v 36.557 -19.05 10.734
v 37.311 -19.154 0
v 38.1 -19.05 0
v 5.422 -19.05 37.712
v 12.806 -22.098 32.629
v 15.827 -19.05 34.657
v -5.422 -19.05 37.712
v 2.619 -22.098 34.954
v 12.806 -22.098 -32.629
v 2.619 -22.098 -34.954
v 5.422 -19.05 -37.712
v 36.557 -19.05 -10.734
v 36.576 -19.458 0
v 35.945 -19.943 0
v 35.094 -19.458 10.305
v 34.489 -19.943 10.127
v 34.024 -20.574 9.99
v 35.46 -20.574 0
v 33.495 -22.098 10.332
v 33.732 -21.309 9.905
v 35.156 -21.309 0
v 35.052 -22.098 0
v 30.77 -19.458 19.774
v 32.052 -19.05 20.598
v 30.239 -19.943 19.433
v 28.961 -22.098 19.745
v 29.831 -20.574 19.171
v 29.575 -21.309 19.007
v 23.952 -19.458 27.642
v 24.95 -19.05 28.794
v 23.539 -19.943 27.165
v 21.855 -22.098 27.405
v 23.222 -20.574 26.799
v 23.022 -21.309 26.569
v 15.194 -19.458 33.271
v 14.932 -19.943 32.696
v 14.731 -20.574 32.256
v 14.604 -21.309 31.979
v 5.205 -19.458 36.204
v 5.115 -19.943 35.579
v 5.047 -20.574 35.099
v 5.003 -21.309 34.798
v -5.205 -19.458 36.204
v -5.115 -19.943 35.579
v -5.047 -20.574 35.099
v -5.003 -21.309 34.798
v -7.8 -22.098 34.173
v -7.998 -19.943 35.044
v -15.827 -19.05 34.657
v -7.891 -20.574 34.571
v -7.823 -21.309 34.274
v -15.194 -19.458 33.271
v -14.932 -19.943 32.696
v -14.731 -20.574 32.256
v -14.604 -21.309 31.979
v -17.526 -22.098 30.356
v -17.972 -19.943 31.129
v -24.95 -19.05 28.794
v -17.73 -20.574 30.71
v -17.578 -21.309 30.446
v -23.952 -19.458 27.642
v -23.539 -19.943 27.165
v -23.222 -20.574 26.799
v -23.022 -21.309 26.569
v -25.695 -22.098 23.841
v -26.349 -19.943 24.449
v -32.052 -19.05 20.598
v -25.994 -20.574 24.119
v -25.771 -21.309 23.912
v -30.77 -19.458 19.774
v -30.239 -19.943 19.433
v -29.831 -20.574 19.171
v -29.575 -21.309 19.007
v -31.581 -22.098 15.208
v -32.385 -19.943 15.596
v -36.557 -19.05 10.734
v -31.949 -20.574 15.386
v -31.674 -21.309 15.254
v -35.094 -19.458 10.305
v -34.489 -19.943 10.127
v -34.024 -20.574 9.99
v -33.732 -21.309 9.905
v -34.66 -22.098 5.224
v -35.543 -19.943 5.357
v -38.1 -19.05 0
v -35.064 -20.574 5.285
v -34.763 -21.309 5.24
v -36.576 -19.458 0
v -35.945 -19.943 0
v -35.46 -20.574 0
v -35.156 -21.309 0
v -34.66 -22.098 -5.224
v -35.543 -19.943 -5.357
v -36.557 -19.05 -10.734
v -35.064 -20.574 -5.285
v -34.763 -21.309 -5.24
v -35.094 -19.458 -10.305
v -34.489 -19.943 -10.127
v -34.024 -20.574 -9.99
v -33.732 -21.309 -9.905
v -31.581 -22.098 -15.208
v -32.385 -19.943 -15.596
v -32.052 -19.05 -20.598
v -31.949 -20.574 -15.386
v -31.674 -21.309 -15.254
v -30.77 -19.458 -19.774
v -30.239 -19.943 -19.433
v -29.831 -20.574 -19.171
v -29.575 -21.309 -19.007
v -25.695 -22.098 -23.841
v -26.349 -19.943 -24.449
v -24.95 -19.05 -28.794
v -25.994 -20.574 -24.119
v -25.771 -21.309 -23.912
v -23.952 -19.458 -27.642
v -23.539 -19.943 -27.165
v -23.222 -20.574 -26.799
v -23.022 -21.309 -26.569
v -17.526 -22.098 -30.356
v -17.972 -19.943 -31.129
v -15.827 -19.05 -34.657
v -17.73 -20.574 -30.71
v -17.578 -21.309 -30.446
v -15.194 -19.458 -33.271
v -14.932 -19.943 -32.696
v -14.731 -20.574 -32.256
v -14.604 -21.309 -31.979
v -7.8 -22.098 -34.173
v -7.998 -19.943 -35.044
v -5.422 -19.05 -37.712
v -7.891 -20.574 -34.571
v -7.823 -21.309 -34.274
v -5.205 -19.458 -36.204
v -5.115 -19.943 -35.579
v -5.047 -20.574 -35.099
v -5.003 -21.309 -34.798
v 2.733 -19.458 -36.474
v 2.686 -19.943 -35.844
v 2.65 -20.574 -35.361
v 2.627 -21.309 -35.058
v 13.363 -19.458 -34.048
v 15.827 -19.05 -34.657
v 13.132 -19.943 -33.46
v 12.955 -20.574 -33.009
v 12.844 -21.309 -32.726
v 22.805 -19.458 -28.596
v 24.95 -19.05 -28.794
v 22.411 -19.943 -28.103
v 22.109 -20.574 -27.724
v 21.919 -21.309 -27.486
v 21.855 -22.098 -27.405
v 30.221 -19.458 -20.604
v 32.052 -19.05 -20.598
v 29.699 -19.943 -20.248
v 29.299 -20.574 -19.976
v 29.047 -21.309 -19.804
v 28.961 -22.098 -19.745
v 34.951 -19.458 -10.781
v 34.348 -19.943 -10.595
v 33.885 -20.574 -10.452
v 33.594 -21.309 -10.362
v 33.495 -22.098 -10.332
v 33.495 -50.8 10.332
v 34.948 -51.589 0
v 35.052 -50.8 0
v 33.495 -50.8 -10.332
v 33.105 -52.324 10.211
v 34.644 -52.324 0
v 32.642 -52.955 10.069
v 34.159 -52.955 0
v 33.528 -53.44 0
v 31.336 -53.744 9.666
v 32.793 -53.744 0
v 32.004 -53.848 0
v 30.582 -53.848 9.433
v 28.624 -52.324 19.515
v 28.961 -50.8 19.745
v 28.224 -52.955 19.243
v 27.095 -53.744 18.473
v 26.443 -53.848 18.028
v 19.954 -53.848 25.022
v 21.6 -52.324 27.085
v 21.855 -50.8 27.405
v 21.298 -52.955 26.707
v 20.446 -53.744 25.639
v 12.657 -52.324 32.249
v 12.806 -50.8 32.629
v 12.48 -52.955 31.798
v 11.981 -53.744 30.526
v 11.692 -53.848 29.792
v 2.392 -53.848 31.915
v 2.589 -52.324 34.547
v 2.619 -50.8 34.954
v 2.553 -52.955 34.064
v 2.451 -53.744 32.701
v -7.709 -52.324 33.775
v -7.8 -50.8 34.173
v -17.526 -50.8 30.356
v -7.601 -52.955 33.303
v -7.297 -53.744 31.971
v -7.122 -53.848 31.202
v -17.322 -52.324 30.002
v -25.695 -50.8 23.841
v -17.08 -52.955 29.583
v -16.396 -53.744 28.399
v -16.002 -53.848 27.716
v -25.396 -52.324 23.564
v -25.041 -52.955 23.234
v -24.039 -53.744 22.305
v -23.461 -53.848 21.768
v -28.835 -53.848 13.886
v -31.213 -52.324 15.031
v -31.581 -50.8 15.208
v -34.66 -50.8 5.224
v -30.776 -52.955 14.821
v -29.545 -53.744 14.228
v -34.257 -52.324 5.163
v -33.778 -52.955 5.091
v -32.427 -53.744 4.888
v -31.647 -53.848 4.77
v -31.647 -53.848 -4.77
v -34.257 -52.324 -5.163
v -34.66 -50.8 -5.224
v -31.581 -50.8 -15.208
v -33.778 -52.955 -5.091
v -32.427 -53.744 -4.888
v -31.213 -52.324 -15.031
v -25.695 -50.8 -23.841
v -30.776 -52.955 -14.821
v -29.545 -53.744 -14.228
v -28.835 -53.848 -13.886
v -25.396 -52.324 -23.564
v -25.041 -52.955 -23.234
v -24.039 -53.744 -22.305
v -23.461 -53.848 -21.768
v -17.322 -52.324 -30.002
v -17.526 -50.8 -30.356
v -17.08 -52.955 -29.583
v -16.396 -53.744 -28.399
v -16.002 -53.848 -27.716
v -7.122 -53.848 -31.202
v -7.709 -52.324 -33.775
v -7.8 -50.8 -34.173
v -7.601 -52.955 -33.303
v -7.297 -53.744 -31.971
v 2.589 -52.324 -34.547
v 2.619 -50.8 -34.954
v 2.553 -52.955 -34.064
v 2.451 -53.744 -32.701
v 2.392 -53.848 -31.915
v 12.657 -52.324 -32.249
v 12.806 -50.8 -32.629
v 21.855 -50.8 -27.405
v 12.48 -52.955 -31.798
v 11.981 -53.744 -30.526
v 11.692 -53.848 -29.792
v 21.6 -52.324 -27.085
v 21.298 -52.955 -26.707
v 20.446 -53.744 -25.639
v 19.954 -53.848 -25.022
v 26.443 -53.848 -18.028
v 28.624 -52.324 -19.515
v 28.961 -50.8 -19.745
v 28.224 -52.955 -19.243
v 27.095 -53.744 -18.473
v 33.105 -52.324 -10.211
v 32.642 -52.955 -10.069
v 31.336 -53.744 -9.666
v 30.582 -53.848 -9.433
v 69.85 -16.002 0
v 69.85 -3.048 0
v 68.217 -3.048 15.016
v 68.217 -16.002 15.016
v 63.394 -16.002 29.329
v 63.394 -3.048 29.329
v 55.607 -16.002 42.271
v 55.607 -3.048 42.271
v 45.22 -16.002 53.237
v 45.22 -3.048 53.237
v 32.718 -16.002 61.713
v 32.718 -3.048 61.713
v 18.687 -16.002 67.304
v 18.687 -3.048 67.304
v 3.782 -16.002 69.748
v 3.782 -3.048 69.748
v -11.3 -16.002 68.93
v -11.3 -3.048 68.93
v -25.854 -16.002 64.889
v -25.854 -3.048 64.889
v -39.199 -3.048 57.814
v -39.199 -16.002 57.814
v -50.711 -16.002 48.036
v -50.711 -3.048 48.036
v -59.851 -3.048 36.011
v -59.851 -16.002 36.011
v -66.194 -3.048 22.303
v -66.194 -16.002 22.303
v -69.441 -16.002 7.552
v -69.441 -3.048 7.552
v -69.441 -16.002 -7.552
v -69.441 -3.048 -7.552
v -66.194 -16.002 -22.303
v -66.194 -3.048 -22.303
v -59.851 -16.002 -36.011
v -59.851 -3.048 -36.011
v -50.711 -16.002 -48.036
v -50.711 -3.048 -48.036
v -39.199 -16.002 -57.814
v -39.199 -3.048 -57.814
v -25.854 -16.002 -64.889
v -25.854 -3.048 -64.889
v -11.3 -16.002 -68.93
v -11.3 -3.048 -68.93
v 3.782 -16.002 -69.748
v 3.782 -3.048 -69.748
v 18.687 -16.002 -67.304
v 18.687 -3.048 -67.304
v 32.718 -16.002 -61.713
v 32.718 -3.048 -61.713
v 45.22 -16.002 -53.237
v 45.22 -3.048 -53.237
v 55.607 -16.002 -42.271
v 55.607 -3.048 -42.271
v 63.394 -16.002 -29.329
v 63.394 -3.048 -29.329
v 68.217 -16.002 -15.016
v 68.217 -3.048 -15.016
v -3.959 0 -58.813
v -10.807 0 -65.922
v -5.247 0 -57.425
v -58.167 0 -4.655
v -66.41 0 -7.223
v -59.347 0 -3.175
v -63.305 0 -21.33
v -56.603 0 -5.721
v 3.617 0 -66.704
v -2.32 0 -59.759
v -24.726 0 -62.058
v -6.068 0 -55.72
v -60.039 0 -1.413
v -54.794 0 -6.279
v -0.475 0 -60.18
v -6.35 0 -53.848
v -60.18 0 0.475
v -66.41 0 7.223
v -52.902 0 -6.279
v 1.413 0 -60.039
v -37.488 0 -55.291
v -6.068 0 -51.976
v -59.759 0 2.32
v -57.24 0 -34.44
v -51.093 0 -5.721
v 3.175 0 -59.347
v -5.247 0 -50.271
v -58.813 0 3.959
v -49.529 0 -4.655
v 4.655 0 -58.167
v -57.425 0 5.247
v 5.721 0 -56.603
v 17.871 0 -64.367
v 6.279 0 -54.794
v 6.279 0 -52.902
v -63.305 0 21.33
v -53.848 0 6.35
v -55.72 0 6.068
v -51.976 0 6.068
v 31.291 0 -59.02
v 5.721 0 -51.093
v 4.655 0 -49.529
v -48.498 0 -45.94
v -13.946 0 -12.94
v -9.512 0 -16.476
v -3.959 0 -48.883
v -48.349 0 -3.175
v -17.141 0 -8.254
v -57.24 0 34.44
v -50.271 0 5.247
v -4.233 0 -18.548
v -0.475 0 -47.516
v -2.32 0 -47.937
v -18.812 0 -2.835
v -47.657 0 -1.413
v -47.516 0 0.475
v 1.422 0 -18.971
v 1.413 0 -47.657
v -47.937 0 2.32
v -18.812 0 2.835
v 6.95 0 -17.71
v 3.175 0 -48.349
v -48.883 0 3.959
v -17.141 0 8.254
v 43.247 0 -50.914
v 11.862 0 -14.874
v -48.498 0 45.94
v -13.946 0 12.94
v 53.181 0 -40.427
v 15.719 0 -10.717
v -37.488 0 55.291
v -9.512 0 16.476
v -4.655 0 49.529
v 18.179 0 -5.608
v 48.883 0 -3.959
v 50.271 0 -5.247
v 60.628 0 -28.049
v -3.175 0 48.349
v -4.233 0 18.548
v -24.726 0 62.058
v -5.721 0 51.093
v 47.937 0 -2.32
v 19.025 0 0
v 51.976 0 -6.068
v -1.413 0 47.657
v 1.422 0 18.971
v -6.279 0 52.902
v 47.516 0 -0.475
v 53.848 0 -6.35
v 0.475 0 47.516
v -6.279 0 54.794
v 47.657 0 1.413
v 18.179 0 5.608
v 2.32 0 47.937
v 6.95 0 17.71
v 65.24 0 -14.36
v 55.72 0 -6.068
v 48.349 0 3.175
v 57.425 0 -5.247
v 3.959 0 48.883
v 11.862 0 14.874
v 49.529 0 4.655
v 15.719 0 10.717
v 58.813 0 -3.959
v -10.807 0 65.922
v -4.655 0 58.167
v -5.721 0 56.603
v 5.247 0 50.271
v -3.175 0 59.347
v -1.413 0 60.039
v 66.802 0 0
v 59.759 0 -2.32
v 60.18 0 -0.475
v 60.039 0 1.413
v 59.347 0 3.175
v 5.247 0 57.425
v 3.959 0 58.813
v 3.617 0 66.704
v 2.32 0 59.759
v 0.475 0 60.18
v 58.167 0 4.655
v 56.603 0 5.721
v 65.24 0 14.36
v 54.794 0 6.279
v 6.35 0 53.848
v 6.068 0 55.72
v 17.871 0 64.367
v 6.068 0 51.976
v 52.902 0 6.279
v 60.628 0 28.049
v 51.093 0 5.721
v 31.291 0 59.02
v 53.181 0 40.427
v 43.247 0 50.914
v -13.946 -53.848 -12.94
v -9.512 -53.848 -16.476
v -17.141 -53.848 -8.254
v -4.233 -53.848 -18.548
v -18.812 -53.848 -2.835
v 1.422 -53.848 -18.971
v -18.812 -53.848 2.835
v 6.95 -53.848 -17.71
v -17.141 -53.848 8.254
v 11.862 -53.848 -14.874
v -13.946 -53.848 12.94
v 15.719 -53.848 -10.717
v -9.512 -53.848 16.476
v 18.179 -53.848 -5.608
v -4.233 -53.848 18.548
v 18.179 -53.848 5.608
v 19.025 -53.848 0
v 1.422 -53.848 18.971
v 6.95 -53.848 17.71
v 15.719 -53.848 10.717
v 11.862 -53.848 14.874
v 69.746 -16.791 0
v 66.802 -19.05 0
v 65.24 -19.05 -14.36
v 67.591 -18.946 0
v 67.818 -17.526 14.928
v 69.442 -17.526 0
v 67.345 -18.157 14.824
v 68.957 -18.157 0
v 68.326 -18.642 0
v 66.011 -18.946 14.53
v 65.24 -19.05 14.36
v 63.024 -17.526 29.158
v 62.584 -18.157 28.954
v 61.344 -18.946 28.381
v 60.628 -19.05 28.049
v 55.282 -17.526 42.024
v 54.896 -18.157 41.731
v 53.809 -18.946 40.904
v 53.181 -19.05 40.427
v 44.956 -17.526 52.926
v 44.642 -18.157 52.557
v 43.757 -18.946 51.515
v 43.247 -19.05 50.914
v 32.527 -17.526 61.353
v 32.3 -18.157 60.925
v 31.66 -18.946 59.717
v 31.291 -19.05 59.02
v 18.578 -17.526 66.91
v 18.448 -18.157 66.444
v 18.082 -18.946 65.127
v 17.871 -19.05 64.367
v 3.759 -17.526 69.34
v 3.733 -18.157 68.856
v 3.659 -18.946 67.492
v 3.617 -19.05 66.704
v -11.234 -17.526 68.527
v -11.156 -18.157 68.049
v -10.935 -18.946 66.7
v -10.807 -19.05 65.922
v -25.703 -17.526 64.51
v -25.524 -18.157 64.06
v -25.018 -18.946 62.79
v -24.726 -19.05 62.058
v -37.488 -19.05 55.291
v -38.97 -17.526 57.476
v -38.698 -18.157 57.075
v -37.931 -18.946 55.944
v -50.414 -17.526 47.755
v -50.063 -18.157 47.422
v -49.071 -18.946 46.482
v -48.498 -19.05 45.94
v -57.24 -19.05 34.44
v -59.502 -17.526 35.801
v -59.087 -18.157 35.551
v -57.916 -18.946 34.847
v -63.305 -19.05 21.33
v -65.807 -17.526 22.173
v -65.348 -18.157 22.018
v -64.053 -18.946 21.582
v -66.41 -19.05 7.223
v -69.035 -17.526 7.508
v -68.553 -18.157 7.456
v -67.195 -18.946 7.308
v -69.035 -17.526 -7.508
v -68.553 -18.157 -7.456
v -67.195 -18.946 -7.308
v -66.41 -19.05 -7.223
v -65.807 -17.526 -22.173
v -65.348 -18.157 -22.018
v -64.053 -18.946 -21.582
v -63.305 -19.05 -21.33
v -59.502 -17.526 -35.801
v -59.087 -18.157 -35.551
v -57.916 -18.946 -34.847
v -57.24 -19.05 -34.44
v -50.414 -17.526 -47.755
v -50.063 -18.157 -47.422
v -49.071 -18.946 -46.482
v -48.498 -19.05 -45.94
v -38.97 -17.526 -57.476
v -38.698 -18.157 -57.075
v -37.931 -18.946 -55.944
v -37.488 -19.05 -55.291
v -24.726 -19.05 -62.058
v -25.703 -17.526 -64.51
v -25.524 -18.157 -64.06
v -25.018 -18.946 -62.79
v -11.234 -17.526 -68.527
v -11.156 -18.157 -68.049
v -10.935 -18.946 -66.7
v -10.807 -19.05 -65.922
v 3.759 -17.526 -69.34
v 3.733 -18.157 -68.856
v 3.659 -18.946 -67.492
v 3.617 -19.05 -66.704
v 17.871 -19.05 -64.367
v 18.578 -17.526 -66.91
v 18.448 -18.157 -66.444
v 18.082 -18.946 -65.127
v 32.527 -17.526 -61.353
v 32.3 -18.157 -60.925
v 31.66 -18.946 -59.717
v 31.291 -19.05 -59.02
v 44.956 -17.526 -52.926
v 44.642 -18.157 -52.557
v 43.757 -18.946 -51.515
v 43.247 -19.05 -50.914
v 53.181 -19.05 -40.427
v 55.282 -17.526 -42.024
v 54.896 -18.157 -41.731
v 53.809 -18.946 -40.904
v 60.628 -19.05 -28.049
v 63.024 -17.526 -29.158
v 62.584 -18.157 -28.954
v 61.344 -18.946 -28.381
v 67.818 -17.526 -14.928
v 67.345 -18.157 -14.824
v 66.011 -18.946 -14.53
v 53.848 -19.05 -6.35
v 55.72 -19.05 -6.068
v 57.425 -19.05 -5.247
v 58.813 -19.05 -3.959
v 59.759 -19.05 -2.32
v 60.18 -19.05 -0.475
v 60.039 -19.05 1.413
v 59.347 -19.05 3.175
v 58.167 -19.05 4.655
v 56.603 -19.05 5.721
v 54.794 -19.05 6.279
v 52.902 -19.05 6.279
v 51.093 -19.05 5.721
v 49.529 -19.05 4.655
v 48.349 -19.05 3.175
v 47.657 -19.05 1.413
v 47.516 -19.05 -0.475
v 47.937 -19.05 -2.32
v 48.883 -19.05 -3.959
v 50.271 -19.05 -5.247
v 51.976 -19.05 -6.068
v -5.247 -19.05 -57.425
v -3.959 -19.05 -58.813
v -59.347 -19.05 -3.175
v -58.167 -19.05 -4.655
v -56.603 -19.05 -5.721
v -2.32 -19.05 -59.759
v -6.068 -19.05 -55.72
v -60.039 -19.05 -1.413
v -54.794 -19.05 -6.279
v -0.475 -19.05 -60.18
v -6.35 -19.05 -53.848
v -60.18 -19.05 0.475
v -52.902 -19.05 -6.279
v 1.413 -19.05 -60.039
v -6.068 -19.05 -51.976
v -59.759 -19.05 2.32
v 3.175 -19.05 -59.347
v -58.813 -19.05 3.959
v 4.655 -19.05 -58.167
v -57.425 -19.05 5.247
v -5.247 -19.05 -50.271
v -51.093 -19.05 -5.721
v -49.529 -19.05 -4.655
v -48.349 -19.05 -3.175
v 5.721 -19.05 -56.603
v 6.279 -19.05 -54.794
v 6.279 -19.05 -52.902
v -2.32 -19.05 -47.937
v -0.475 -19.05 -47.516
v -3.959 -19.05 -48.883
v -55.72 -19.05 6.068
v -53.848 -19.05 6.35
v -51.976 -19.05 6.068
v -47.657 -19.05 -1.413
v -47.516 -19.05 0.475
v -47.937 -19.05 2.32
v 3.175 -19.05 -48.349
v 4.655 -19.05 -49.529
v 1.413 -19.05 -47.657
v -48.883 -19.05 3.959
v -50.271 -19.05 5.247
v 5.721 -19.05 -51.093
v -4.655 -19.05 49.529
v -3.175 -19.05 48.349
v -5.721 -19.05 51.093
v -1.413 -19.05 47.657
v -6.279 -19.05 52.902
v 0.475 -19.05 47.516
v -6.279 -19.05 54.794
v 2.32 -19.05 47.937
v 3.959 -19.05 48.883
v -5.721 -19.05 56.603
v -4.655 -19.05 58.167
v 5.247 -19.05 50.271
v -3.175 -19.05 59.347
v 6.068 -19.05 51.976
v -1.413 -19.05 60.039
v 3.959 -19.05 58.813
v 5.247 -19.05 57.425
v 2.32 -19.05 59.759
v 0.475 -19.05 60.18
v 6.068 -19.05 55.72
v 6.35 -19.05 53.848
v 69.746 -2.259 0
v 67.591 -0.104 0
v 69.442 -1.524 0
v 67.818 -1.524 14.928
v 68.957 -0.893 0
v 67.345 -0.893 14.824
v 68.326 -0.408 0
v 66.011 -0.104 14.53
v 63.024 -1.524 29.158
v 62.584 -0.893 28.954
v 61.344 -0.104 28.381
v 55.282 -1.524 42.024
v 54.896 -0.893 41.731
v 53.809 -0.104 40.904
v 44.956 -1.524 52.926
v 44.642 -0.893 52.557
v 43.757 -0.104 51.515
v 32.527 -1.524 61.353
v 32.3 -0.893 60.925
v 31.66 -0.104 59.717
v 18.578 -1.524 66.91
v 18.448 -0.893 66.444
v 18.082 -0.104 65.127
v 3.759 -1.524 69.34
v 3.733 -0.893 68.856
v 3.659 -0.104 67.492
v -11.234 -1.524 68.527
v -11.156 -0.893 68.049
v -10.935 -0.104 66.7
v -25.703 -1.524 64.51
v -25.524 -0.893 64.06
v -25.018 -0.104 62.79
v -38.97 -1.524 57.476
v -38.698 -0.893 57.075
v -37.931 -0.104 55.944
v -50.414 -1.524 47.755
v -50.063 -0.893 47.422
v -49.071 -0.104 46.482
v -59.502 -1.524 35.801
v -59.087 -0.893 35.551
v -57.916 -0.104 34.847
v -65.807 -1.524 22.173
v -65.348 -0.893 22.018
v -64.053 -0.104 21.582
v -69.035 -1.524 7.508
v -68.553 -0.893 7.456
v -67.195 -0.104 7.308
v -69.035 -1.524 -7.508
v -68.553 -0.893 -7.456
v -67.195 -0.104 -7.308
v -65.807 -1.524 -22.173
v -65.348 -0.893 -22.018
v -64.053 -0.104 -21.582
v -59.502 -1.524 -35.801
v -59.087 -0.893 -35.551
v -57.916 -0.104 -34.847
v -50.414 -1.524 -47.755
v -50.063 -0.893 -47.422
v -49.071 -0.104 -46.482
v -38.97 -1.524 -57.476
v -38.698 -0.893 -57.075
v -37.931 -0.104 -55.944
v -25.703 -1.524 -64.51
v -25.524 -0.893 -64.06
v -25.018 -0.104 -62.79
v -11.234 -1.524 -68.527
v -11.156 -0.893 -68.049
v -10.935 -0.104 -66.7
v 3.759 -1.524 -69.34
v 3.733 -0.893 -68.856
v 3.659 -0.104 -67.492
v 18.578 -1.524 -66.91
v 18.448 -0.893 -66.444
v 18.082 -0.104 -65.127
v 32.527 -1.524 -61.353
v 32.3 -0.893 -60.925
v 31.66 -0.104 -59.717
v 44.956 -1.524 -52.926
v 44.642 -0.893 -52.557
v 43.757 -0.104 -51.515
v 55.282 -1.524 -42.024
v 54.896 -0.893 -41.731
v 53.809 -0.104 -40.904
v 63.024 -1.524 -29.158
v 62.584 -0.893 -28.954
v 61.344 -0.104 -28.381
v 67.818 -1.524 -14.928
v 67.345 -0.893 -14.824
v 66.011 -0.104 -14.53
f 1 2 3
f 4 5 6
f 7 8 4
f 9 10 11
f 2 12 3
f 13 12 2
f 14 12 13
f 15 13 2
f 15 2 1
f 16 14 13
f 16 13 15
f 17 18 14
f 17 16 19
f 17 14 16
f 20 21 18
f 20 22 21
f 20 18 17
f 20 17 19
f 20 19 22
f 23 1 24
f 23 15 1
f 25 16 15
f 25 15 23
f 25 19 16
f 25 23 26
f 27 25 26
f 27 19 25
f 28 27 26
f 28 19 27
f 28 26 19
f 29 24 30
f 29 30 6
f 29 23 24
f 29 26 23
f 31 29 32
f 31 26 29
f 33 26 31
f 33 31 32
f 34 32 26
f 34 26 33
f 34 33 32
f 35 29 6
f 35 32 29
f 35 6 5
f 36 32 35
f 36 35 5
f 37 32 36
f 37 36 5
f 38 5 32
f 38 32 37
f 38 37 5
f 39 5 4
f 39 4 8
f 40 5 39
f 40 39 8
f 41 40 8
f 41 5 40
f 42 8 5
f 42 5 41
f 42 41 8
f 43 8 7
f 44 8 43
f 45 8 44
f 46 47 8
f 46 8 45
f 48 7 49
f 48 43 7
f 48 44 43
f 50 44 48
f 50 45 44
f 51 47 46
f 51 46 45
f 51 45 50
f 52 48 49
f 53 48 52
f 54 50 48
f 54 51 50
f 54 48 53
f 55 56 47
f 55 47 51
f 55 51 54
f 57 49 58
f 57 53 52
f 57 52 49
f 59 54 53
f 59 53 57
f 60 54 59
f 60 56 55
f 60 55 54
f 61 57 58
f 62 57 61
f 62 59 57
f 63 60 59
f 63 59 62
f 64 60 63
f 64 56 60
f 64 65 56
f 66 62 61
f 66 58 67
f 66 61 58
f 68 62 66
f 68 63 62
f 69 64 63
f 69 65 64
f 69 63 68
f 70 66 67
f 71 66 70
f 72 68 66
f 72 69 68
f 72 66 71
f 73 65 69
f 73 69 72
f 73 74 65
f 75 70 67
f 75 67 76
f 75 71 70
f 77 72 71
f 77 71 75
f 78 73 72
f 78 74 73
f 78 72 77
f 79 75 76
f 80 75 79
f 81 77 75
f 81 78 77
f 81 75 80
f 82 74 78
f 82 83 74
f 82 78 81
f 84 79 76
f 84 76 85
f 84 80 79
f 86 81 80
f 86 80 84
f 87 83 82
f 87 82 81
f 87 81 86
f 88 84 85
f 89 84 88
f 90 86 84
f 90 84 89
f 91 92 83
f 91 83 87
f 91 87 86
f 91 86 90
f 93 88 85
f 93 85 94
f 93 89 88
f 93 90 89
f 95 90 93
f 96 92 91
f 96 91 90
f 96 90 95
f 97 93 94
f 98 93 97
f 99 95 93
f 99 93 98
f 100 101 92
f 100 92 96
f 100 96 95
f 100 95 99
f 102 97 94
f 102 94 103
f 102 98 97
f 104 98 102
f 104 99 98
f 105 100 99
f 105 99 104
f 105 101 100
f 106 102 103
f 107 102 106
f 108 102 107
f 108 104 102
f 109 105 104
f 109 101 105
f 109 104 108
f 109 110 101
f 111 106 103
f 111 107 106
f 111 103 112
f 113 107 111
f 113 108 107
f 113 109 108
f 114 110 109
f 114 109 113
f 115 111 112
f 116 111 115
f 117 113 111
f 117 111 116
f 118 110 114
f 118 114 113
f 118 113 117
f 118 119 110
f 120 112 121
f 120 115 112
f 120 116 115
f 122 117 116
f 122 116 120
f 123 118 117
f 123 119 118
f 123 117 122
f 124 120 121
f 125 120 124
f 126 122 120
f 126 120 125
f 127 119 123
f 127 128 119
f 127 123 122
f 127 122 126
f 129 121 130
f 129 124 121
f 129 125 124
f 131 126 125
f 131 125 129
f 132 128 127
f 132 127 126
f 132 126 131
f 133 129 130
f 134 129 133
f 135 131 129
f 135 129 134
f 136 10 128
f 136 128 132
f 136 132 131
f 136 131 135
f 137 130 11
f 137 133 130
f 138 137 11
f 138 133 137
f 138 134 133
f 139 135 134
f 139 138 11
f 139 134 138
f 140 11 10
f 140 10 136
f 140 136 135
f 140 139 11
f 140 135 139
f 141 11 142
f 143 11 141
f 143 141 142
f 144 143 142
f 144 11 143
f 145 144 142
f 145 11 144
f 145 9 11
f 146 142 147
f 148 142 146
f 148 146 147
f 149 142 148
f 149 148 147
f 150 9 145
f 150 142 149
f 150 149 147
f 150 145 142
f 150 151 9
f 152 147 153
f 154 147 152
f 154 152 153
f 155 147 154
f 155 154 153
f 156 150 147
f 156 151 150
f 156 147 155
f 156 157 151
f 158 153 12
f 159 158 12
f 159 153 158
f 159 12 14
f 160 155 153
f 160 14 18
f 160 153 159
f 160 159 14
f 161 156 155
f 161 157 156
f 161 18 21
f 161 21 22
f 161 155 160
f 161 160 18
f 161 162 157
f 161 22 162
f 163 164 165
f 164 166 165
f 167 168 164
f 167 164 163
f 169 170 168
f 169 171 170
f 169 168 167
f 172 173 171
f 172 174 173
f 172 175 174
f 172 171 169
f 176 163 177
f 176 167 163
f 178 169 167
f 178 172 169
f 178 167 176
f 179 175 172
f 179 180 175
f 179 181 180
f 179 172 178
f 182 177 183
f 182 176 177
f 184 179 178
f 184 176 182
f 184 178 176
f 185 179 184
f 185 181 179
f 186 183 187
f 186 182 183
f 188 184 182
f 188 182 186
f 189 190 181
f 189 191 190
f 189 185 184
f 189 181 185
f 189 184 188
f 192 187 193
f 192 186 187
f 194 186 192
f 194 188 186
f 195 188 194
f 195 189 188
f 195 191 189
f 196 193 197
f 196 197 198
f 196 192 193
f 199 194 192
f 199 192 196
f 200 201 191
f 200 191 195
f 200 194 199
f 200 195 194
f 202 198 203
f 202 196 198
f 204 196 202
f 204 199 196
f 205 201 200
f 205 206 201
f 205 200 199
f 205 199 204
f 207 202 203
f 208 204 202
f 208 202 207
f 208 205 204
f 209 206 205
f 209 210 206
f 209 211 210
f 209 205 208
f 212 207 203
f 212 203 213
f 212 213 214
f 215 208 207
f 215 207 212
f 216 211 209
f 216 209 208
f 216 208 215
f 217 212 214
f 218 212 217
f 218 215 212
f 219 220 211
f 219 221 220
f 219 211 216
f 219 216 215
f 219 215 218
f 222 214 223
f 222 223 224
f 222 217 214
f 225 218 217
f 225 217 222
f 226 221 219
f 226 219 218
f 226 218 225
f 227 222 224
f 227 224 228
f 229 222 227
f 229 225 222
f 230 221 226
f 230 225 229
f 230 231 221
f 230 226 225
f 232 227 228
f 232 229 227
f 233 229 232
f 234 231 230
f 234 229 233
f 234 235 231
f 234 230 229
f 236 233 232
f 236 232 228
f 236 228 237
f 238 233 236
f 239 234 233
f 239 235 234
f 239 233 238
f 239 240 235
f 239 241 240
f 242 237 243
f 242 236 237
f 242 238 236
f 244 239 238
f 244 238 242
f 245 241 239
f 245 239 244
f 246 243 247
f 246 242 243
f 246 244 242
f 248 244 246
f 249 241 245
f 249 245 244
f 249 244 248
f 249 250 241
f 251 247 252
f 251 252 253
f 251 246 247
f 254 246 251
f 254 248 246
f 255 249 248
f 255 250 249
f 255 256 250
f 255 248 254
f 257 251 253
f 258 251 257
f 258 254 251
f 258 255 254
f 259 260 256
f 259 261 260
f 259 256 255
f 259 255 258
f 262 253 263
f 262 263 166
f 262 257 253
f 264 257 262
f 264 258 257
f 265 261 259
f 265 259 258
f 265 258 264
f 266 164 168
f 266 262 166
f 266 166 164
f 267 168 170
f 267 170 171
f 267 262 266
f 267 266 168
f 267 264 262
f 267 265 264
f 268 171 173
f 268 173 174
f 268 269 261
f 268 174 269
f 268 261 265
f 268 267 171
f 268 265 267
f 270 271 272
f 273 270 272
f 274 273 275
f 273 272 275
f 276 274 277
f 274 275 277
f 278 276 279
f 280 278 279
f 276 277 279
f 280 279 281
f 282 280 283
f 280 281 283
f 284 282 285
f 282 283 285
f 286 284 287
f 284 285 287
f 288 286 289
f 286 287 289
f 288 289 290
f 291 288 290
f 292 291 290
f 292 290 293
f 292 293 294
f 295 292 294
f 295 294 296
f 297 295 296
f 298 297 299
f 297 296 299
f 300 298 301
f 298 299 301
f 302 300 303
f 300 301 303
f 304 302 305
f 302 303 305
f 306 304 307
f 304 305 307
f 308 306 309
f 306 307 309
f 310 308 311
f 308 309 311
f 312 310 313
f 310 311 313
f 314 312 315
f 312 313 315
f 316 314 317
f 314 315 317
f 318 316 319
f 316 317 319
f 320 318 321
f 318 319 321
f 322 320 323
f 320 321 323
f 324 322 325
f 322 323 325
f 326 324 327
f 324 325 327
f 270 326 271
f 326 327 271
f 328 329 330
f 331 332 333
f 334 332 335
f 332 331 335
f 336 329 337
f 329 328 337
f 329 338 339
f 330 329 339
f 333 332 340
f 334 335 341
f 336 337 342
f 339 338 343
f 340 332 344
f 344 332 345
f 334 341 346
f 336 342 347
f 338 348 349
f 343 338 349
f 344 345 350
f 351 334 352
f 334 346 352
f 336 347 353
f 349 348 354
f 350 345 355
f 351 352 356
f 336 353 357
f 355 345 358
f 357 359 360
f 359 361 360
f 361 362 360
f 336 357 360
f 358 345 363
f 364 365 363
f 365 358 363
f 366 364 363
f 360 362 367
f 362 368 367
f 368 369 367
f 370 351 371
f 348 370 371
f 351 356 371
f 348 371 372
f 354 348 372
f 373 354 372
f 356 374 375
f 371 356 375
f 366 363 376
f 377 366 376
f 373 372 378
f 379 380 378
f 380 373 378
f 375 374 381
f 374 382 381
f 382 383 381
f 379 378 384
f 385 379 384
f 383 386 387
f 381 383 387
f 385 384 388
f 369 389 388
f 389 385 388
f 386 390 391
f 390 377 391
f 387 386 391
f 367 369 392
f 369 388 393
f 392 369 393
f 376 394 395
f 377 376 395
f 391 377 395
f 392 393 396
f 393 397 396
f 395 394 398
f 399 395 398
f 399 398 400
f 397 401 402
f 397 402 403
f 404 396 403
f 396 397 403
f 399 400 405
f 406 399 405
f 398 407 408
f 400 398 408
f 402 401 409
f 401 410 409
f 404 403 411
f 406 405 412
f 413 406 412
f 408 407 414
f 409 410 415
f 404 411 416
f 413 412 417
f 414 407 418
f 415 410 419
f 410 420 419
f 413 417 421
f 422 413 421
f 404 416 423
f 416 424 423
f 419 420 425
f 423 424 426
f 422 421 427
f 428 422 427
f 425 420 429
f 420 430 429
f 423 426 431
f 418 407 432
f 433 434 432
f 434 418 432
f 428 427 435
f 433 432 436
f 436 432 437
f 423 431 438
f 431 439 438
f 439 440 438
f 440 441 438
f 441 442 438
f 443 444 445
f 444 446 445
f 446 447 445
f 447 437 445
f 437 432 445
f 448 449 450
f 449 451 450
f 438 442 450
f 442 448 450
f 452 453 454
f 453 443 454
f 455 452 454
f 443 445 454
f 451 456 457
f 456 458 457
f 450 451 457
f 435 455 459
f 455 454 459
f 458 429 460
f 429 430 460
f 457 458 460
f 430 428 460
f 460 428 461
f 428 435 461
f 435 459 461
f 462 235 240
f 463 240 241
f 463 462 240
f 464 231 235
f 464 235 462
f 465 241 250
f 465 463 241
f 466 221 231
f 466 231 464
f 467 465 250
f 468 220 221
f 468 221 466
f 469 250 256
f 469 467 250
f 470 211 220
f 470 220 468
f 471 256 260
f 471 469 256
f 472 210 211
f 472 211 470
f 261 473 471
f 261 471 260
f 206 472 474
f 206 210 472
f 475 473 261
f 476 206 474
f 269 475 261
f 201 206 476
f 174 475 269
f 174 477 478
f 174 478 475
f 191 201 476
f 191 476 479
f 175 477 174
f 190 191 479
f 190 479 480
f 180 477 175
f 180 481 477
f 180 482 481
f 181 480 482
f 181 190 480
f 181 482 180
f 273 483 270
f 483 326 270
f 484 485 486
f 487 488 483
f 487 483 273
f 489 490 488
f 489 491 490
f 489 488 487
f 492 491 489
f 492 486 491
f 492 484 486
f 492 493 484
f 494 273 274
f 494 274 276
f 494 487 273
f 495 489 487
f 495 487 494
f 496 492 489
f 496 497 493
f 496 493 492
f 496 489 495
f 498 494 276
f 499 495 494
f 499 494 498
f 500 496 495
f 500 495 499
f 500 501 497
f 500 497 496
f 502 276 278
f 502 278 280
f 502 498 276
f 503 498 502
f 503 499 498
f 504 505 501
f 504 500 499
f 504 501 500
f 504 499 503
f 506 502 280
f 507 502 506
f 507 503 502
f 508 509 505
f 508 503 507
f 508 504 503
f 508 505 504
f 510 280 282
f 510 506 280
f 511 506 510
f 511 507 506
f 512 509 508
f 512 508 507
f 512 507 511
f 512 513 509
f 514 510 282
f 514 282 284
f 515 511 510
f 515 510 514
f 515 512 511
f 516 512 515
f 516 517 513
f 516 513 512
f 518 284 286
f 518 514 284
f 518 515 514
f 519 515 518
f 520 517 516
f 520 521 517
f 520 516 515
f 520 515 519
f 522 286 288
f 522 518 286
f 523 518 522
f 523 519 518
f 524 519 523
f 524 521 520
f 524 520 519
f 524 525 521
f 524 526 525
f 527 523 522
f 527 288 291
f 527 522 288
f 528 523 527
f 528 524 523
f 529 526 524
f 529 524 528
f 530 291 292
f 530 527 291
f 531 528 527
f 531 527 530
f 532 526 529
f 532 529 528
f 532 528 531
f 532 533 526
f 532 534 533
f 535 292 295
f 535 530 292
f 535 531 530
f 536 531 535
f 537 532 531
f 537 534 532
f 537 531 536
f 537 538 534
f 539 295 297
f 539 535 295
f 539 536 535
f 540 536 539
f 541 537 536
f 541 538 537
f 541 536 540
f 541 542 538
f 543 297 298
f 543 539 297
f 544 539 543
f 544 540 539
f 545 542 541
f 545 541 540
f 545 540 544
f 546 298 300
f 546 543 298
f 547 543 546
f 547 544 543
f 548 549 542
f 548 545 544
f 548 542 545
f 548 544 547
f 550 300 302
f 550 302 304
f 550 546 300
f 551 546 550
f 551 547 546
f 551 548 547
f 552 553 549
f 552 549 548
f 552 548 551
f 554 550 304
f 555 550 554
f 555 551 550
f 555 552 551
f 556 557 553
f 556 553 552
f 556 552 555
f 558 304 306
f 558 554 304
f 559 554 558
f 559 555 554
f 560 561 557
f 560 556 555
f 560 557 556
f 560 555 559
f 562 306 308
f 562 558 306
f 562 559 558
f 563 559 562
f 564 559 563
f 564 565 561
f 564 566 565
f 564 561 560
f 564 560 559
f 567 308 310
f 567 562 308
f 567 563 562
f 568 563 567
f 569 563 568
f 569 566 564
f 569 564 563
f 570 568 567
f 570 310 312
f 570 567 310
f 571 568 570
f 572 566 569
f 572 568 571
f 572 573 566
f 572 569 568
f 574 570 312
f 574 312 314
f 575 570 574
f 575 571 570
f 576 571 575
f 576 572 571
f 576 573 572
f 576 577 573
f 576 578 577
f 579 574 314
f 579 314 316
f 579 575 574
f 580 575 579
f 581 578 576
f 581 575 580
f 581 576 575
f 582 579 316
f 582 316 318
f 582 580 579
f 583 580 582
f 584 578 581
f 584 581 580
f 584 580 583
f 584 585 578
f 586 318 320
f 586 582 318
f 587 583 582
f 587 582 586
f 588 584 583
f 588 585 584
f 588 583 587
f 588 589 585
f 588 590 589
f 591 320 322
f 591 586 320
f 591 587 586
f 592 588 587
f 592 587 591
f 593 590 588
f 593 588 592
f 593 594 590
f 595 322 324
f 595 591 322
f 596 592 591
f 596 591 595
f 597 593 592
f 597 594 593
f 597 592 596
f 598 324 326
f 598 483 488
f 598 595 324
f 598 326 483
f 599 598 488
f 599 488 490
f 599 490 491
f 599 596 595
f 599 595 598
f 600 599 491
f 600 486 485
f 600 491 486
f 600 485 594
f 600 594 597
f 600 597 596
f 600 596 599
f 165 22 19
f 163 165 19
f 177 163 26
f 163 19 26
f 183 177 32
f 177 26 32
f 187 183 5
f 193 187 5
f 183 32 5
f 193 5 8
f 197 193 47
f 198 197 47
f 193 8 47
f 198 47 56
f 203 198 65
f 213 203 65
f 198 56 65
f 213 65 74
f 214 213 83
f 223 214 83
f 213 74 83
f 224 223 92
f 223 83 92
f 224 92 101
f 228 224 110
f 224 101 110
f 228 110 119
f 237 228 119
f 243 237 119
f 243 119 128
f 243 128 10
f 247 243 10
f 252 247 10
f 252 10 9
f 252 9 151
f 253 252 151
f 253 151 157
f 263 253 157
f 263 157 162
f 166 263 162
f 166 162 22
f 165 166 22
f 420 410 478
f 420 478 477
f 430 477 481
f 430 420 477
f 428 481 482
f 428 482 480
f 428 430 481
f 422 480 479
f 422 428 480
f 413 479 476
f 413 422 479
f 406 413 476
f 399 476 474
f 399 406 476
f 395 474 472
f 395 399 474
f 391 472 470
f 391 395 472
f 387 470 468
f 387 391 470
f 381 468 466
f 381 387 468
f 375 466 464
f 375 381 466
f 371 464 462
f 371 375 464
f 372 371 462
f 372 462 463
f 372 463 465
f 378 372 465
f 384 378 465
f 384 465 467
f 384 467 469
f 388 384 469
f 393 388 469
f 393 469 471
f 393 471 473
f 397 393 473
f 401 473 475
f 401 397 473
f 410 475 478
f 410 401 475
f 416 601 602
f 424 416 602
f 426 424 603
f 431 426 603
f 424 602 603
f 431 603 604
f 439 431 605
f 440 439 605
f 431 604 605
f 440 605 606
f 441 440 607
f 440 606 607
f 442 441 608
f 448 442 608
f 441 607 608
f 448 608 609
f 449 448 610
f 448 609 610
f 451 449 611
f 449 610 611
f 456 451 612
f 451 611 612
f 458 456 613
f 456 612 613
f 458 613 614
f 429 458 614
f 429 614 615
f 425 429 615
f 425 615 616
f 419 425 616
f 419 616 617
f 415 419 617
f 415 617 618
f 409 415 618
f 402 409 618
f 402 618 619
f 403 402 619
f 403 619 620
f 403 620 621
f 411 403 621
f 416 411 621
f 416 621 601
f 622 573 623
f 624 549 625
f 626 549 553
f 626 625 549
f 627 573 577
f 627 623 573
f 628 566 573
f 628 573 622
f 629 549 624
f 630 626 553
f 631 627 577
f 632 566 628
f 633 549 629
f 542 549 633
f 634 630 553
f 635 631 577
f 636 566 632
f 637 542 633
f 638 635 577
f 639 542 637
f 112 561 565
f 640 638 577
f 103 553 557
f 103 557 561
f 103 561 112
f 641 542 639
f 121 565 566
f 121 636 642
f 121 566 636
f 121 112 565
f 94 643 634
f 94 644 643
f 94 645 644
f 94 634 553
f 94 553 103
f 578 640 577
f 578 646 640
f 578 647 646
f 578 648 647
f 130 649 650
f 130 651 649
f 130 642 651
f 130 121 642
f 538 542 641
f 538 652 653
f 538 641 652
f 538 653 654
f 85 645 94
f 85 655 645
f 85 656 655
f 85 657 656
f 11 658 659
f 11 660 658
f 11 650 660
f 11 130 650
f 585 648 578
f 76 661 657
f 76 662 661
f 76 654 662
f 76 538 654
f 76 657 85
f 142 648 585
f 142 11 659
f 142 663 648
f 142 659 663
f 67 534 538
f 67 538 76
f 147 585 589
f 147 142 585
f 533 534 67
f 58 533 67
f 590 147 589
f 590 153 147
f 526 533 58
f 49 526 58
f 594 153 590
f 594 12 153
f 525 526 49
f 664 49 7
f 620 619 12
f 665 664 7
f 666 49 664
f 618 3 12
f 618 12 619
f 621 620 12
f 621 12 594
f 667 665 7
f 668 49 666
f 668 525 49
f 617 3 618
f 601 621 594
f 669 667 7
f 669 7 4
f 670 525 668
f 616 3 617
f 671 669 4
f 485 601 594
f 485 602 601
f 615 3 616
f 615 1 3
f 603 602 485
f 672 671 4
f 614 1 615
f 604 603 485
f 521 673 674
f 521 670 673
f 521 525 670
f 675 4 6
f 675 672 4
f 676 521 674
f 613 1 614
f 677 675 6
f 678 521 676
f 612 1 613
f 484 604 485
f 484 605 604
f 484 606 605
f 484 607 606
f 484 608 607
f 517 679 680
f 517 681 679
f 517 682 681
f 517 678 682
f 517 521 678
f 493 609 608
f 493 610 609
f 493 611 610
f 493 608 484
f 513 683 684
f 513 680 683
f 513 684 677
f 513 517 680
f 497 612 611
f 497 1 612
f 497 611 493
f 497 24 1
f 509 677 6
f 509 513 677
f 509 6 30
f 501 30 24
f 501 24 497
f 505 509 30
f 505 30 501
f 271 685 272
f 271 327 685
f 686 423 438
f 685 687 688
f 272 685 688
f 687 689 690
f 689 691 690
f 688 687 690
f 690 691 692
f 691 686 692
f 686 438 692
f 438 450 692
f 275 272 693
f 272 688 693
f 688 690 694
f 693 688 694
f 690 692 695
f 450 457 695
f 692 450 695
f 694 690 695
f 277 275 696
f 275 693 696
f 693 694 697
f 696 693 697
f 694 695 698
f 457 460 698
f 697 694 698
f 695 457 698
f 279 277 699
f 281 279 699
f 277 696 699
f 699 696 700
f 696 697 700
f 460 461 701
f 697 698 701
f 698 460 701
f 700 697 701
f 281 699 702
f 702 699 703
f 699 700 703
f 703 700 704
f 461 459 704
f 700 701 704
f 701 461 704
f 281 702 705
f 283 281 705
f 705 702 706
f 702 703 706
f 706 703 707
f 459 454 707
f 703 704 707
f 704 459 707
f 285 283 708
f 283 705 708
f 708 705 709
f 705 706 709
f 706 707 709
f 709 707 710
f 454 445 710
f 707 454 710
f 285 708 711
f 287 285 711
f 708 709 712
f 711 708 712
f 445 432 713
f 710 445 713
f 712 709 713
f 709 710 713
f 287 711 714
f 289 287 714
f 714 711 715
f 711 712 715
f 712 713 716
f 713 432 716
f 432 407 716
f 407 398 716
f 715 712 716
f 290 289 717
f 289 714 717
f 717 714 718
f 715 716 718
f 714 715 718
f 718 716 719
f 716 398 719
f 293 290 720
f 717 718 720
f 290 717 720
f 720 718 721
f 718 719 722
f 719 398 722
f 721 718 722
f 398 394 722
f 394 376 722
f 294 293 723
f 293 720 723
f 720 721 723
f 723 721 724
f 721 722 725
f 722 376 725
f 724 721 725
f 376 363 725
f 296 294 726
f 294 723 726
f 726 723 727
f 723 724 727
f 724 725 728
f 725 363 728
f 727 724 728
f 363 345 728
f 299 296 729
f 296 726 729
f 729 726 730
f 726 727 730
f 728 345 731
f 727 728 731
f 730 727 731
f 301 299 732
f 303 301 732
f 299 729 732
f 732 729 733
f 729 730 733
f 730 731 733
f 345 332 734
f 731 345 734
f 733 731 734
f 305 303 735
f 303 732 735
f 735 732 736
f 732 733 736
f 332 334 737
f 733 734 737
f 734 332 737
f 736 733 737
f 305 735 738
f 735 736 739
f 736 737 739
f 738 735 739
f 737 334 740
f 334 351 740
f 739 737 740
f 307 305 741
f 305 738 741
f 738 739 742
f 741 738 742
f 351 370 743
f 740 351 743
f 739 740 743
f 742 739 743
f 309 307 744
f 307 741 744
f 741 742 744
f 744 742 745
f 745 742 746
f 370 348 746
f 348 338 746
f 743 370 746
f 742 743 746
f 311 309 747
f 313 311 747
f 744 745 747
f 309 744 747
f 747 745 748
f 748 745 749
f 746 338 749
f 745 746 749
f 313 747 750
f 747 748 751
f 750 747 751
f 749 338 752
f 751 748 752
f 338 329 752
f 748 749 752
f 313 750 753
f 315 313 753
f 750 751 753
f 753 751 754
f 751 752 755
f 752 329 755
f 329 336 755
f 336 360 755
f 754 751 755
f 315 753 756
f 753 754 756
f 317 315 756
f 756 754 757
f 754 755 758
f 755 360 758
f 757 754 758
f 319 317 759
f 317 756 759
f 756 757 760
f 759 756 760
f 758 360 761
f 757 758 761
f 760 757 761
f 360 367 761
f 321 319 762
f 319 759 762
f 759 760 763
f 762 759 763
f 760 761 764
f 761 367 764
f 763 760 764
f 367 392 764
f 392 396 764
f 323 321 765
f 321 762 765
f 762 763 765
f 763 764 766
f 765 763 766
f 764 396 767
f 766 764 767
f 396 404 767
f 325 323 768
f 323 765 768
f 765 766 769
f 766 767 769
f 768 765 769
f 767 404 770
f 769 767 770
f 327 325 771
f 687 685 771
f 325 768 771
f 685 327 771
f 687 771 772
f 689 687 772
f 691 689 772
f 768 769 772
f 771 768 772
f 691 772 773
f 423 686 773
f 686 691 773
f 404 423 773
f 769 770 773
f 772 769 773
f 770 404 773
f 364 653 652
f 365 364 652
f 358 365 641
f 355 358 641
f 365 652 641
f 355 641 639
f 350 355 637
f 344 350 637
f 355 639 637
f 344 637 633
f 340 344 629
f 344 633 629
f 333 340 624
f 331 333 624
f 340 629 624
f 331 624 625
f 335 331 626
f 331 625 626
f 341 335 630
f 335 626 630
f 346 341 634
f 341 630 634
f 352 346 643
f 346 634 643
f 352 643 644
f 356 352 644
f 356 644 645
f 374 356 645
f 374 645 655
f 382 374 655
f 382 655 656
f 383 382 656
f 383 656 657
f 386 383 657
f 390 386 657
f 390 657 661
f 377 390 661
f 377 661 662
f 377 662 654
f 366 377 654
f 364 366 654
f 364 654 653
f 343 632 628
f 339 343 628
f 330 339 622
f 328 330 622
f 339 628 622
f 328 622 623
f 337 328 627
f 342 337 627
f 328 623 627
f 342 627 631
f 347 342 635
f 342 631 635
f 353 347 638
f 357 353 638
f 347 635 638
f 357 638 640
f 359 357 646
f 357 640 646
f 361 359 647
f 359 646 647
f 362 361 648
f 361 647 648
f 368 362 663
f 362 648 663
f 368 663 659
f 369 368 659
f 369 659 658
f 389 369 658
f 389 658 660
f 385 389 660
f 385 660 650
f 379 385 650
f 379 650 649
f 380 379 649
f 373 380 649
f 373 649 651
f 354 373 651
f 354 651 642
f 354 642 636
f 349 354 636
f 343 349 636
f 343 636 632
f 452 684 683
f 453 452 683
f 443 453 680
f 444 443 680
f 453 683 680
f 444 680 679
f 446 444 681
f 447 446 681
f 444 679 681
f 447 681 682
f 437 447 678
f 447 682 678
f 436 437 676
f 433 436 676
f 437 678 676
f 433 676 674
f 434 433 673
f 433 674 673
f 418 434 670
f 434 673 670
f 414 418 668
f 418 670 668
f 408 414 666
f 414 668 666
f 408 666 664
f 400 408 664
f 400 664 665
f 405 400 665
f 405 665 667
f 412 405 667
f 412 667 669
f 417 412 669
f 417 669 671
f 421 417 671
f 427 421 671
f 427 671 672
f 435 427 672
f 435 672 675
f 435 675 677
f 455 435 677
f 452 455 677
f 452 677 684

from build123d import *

# Parameters (mm, degrees)
F0_R            = 35.052
F0_R_2          = 19.0246
F1_DEPTH        = 53.848
F0_R_3          = 69.85
F0_R_4          = 53.848
F2_DEPTH        = 19.05
F3_R            = 3.048
F4_R            = 6.35
F5_DEPTH        = 19.051
F5_COPIES_COUNT = 4


# Not quite as in the source:
# - a pattern or mirror of a feature is missing from the dataset's text; its kind, count and spacing are read off the source's solid
# - a feature names something its author has since deleted; it is built from what else it names


with BuildPart() as f1:
    # F0 (on Front) → F1 (new body)
    with BuildSketch(Plane.XZ):
        Circle(F0_R)
        Circle(F0_R_2, mode=Mode.SUBTRACT)
    extrude(amount=F1_DEPTH)

    # F0 (on Front) → F2 (join)
    with BuildSketch(Plane.XZ):
        Circle(F0_R_3)
        Circle(F0_R_4, mode=Mode.SUBTRACT)
        Circle(F0_R_4)
        Circle(F0_R, mode=Mode.SUBTRACT)
    extrude(amount=F2_DEPTH)

    # F3
    f3_edges = [f1.edges().sort_by_distance(p)[0] for p in [
        (-69.85, -19.05, 0),
        (-69.85, 0, 0),
        (-35.052, -19.05, 0),
        (-35.052, -53.848, 0),
    ]]
    fillet(f3_edges, radius=F3_R)

    # F4 (on face) → F5 (cut, through all)
    with BuildSketch(Plane.XZ.offset(19.05)):
        with Locations((0, 53.848)):
            Circle(F4_R)
    f5 = extrude(amount=-F5_DEPTH, mode=Mode.SUBTRACT)

    # F5_copies: F5 ×4 about axis
    f5_copies_axis = Axis((0, 0, 0), (0, 1, 0))
    for i in range(1, F5_COPIES_COUNT):
        add(f5.rotate(f5_copies_axis, i * 360 / F5_COPIES_COUNT), mode=Mode.SUBTRACT)


solid = f1.part
